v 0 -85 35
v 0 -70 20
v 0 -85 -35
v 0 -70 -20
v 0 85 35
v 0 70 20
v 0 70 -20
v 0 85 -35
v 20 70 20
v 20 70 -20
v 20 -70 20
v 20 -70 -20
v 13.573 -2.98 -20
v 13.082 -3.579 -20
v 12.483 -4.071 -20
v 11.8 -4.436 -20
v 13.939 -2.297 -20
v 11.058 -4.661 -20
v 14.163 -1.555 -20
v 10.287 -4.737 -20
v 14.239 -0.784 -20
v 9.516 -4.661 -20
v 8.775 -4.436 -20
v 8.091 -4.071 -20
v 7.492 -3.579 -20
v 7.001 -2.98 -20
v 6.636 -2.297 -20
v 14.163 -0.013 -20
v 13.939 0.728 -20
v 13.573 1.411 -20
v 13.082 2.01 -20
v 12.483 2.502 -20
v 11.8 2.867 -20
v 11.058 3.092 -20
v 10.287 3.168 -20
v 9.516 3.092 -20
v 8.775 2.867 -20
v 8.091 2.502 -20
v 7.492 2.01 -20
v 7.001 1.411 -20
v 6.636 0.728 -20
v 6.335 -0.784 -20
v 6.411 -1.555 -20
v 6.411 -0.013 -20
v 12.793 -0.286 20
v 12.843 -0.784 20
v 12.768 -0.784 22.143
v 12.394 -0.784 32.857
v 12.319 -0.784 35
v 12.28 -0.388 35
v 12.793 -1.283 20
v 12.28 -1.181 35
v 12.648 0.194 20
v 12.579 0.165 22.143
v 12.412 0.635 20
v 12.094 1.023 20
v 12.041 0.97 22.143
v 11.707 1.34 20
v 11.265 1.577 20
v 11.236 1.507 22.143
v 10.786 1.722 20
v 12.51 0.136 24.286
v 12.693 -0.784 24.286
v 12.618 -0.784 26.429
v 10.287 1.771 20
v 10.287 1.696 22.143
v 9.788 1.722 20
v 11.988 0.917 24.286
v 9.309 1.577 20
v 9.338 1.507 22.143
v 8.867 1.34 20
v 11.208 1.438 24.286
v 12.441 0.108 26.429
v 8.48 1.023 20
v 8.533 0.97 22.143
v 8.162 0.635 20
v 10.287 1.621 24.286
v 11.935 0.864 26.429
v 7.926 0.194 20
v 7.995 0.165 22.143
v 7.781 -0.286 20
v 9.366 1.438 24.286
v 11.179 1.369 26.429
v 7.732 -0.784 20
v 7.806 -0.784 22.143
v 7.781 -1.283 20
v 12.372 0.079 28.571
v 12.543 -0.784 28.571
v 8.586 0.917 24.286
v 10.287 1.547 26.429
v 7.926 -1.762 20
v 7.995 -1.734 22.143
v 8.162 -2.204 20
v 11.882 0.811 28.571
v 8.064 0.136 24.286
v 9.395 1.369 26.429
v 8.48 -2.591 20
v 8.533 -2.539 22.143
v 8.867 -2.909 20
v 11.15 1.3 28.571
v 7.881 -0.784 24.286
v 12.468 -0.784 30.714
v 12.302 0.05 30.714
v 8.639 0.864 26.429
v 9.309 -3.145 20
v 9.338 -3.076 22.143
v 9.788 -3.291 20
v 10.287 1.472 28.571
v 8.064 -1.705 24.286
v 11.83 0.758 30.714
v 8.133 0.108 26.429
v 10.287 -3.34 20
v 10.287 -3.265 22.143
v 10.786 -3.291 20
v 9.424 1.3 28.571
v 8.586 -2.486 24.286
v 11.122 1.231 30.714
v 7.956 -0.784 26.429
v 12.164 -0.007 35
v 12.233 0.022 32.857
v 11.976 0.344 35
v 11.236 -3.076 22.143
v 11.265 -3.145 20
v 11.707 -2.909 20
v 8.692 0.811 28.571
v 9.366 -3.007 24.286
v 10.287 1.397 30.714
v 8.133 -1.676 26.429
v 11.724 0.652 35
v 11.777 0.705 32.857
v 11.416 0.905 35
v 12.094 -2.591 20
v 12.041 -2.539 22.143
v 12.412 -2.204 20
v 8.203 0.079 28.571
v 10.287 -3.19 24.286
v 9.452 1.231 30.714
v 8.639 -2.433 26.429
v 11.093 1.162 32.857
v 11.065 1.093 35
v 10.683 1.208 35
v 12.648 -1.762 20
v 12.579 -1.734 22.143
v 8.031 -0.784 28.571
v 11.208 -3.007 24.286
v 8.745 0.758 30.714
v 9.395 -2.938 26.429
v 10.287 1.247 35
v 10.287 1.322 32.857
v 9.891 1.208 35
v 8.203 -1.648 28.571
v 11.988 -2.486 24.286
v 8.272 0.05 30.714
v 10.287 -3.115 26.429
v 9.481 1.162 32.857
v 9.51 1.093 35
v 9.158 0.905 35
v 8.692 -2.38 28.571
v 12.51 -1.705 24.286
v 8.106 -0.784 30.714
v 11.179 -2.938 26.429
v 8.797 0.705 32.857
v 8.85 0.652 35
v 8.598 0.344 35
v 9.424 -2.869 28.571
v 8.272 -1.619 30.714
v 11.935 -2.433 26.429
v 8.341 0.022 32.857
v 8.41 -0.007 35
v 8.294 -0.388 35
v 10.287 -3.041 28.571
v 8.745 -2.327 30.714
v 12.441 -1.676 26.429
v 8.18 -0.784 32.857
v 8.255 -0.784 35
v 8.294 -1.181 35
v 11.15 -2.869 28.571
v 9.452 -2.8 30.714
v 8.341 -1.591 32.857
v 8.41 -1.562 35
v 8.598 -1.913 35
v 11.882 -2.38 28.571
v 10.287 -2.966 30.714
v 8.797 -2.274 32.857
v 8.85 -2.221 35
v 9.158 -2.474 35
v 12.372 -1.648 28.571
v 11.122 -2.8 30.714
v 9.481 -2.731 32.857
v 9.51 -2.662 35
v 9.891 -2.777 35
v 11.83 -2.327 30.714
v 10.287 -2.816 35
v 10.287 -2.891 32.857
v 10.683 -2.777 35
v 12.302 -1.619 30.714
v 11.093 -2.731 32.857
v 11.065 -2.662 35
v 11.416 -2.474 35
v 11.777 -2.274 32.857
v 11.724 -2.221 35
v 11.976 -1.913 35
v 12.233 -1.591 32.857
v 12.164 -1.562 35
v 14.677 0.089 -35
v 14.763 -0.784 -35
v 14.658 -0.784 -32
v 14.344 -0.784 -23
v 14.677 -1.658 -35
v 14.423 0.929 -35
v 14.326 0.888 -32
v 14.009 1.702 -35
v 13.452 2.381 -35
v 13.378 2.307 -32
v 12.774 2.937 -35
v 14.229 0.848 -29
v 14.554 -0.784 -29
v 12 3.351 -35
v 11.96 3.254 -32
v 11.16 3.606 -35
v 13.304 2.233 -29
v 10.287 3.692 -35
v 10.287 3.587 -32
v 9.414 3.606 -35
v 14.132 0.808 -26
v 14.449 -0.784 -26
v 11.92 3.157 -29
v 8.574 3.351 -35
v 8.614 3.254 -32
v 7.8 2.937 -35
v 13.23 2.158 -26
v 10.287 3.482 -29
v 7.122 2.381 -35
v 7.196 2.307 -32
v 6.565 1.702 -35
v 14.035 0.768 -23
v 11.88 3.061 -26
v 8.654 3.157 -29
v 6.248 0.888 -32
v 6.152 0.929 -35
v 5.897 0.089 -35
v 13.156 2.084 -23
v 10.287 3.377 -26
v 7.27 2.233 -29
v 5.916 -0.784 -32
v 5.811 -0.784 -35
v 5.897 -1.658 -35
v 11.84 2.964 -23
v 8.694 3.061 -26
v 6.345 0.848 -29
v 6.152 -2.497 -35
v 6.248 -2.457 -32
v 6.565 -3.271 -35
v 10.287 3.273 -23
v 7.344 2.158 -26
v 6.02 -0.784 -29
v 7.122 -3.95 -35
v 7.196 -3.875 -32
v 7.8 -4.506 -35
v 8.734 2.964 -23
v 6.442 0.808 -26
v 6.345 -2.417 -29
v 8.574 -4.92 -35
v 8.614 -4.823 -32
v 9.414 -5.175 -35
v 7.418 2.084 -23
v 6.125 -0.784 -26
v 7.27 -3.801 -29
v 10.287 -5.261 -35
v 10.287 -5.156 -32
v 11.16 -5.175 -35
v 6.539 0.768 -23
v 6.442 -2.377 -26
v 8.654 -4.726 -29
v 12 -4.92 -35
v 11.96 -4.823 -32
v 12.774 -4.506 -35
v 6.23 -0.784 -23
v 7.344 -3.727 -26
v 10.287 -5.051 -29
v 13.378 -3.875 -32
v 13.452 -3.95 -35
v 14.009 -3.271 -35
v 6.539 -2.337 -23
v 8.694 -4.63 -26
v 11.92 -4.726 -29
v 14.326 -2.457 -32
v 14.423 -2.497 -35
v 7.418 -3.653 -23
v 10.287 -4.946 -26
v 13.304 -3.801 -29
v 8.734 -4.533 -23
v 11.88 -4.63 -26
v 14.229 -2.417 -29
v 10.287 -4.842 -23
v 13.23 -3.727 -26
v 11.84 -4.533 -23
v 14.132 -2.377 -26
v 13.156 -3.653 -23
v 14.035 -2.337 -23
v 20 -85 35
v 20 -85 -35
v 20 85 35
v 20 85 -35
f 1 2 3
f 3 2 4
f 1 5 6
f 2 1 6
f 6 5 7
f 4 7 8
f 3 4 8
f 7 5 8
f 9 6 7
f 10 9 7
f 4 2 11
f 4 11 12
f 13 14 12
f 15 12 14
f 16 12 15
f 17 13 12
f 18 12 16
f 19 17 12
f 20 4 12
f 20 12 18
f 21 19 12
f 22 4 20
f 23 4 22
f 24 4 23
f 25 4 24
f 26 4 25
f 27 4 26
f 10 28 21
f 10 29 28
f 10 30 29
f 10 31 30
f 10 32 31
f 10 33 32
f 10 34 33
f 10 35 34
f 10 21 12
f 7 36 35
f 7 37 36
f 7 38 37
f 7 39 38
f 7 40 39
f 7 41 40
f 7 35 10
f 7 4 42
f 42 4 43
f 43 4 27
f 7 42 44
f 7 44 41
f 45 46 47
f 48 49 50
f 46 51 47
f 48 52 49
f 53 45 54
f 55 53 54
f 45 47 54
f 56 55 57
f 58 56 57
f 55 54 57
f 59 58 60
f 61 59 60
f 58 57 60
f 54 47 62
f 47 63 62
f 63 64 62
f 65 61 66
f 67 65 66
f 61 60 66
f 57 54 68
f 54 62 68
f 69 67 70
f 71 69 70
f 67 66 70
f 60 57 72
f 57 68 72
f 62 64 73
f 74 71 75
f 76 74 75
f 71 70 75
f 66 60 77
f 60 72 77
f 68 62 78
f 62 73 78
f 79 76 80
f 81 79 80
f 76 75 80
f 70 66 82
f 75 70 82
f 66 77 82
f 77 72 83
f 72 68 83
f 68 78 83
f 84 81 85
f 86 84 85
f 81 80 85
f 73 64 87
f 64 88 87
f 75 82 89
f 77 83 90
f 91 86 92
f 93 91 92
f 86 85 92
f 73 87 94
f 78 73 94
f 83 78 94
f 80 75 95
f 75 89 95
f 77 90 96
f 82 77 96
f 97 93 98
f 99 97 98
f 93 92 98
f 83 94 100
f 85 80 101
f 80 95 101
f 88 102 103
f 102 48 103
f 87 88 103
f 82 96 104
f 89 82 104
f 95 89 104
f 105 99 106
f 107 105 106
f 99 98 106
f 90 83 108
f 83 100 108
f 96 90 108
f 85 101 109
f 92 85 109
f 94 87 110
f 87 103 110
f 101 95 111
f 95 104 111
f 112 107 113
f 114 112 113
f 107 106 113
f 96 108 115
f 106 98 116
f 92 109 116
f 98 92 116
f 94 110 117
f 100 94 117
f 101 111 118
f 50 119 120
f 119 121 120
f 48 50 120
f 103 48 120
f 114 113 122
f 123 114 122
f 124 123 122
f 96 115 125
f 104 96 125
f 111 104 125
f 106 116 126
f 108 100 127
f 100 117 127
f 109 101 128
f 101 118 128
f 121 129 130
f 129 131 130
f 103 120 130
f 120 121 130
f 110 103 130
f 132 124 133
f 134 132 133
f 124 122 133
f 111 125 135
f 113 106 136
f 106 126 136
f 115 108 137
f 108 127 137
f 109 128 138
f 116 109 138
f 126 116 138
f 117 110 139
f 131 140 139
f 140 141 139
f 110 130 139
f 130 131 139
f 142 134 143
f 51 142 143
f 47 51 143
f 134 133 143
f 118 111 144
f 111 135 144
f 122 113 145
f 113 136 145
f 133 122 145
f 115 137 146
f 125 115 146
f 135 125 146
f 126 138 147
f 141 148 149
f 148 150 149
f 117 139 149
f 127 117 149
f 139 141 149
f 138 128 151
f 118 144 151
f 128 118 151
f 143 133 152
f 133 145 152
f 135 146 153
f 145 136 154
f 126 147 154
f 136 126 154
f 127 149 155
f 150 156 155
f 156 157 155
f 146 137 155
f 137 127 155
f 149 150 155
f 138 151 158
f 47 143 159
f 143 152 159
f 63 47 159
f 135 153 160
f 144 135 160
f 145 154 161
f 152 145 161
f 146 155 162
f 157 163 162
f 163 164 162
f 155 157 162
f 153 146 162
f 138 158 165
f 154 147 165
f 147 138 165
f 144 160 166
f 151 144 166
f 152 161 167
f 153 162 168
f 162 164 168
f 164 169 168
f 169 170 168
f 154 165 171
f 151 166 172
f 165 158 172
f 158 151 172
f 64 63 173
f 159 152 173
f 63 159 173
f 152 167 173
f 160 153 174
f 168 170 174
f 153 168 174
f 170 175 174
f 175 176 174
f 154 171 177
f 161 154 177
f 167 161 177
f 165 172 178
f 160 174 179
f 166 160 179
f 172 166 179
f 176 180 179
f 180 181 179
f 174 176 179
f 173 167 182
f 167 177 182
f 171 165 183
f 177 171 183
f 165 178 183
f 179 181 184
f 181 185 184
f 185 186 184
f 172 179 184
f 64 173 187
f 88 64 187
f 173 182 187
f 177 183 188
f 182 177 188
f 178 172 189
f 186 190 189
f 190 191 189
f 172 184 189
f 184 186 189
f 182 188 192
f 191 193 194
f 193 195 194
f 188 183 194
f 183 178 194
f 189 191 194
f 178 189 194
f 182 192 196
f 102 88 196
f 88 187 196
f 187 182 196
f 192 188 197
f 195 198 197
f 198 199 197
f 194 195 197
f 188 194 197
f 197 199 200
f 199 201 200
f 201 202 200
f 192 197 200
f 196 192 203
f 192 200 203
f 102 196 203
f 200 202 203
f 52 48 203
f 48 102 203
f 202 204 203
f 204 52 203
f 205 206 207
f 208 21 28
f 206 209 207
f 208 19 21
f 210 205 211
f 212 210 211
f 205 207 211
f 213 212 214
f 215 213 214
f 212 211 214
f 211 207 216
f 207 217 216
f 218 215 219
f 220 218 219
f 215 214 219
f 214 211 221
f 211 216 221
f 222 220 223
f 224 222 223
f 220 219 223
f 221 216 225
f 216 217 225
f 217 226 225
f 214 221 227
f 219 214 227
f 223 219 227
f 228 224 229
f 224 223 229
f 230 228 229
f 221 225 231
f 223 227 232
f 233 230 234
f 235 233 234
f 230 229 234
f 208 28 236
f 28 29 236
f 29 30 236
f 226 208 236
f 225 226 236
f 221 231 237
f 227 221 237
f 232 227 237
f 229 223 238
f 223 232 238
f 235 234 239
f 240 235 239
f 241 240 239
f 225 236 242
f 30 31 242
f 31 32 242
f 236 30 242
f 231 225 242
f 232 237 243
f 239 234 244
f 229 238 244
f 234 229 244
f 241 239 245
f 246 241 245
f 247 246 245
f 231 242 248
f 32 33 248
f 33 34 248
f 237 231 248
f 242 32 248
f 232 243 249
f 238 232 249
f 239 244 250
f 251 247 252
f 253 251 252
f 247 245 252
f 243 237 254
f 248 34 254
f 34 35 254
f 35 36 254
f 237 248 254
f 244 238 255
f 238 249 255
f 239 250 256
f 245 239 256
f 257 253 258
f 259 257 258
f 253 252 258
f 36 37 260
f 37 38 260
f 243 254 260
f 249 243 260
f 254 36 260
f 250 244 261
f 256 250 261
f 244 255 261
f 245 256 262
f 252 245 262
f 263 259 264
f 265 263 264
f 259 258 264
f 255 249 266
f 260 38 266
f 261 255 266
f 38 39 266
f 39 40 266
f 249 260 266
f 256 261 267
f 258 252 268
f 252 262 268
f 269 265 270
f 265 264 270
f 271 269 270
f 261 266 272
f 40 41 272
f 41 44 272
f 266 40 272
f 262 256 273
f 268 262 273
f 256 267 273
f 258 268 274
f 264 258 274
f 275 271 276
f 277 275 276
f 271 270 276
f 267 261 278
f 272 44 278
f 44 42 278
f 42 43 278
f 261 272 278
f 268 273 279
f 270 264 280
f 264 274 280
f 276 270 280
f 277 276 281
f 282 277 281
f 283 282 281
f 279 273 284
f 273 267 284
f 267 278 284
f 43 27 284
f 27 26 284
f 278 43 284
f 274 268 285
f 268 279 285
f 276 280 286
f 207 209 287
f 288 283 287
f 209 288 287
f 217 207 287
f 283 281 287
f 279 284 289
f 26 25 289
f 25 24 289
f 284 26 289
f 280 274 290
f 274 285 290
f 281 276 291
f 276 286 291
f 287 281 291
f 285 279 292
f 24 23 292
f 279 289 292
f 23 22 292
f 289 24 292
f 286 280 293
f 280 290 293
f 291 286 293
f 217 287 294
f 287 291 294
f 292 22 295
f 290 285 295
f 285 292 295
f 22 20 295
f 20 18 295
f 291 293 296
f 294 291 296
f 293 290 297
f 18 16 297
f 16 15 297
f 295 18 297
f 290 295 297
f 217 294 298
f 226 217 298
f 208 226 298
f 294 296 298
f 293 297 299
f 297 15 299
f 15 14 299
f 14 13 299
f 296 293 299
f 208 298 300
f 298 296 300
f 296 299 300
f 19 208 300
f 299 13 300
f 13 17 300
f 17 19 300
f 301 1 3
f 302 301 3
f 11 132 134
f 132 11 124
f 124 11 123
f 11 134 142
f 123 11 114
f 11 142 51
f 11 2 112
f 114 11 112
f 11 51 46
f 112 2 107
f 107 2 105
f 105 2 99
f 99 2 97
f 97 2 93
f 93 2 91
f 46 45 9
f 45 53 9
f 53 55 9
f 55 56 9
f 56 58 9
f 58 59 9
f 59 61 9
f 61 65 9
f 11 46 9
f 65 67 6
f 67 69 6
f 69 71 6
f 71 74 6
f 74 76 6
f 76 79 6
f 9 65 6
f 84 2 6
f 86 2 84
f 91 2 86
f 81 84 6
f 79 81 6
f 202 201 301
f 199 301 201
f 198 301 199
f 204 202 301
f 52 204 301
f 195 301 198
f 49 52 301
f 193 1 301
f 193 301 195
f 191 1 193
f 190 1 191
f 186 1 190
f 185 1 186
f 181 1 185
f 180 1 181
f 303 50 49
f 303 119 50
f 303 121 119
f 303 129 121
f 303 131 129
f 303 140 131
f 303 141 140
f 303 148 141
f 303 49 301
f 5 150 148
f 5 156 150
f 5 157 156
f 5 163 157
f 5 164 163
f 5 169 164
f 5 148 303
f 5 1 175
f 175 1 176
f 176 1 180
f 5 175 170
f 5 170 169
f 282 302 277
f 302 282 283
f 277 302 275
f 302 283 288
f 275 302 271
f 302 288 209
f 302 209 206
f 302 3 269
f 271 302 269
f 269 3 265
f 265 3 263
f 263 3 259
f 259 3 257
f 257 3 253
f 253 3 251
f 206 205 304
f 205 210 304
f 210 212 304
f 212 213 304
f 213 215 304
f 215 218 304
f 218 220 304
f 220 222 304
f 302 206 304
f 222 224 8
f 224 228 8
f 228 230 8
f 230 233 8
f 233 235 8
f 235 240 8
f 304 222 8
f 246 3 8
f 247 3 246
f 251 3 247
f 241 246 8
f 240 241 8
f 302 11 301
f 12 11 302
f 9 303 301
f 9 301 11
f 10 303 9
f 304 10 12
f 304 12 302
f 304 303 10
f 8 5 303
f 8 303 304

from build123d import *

# Parameters (mm, degrees)
SKETCH1_W           = 70
SKETCH1_H           = 170
SKETCH1_W_2         = 40
SKETCH1_H_2         = 140
BOSS_EXTRUDE1_DEPTH = 20


# Read off the part's stored shape, not the designer's step: Hole1
with BuildPart() as part:
    # Sketch1 → Boss-Extrude1 (new body)
    with BuildSketch(Plane(origin=(0, 0, 0), x_dir=(0, 0, -1), z_dir=(1, 0, 0))):
        Rectangle(SKETCH1_W, SKETCH1_H)
        Rectangle(SKETCH1_W_2, SKETCH1_H_2, mode=Mode.SUBTRACT)
    extrude(amount=BOSS_EXTRUDE1_DEPTH)

    # Hole1 outline → Hole1 (revolve, cut)
    with BuildSketch(Plane(origin=(10.287047222, -0.784426919, 0), x_dir=(1, 0, 0), z_dir=(0, -1, 0))):
        Polygon((0, 20), (2.555546136, 20), (2.031734593, 35), (0, 35), align=None)
        Polygon((3.952376915, -20), (0, -20), (0, -35), (4.476188458, -35), align=None)
    revolve(axis=Axis((10.287047222, -0.784426919, 0), (0, 0, 1)), mode=Mode.SUBTRACT)


solid = part.part
